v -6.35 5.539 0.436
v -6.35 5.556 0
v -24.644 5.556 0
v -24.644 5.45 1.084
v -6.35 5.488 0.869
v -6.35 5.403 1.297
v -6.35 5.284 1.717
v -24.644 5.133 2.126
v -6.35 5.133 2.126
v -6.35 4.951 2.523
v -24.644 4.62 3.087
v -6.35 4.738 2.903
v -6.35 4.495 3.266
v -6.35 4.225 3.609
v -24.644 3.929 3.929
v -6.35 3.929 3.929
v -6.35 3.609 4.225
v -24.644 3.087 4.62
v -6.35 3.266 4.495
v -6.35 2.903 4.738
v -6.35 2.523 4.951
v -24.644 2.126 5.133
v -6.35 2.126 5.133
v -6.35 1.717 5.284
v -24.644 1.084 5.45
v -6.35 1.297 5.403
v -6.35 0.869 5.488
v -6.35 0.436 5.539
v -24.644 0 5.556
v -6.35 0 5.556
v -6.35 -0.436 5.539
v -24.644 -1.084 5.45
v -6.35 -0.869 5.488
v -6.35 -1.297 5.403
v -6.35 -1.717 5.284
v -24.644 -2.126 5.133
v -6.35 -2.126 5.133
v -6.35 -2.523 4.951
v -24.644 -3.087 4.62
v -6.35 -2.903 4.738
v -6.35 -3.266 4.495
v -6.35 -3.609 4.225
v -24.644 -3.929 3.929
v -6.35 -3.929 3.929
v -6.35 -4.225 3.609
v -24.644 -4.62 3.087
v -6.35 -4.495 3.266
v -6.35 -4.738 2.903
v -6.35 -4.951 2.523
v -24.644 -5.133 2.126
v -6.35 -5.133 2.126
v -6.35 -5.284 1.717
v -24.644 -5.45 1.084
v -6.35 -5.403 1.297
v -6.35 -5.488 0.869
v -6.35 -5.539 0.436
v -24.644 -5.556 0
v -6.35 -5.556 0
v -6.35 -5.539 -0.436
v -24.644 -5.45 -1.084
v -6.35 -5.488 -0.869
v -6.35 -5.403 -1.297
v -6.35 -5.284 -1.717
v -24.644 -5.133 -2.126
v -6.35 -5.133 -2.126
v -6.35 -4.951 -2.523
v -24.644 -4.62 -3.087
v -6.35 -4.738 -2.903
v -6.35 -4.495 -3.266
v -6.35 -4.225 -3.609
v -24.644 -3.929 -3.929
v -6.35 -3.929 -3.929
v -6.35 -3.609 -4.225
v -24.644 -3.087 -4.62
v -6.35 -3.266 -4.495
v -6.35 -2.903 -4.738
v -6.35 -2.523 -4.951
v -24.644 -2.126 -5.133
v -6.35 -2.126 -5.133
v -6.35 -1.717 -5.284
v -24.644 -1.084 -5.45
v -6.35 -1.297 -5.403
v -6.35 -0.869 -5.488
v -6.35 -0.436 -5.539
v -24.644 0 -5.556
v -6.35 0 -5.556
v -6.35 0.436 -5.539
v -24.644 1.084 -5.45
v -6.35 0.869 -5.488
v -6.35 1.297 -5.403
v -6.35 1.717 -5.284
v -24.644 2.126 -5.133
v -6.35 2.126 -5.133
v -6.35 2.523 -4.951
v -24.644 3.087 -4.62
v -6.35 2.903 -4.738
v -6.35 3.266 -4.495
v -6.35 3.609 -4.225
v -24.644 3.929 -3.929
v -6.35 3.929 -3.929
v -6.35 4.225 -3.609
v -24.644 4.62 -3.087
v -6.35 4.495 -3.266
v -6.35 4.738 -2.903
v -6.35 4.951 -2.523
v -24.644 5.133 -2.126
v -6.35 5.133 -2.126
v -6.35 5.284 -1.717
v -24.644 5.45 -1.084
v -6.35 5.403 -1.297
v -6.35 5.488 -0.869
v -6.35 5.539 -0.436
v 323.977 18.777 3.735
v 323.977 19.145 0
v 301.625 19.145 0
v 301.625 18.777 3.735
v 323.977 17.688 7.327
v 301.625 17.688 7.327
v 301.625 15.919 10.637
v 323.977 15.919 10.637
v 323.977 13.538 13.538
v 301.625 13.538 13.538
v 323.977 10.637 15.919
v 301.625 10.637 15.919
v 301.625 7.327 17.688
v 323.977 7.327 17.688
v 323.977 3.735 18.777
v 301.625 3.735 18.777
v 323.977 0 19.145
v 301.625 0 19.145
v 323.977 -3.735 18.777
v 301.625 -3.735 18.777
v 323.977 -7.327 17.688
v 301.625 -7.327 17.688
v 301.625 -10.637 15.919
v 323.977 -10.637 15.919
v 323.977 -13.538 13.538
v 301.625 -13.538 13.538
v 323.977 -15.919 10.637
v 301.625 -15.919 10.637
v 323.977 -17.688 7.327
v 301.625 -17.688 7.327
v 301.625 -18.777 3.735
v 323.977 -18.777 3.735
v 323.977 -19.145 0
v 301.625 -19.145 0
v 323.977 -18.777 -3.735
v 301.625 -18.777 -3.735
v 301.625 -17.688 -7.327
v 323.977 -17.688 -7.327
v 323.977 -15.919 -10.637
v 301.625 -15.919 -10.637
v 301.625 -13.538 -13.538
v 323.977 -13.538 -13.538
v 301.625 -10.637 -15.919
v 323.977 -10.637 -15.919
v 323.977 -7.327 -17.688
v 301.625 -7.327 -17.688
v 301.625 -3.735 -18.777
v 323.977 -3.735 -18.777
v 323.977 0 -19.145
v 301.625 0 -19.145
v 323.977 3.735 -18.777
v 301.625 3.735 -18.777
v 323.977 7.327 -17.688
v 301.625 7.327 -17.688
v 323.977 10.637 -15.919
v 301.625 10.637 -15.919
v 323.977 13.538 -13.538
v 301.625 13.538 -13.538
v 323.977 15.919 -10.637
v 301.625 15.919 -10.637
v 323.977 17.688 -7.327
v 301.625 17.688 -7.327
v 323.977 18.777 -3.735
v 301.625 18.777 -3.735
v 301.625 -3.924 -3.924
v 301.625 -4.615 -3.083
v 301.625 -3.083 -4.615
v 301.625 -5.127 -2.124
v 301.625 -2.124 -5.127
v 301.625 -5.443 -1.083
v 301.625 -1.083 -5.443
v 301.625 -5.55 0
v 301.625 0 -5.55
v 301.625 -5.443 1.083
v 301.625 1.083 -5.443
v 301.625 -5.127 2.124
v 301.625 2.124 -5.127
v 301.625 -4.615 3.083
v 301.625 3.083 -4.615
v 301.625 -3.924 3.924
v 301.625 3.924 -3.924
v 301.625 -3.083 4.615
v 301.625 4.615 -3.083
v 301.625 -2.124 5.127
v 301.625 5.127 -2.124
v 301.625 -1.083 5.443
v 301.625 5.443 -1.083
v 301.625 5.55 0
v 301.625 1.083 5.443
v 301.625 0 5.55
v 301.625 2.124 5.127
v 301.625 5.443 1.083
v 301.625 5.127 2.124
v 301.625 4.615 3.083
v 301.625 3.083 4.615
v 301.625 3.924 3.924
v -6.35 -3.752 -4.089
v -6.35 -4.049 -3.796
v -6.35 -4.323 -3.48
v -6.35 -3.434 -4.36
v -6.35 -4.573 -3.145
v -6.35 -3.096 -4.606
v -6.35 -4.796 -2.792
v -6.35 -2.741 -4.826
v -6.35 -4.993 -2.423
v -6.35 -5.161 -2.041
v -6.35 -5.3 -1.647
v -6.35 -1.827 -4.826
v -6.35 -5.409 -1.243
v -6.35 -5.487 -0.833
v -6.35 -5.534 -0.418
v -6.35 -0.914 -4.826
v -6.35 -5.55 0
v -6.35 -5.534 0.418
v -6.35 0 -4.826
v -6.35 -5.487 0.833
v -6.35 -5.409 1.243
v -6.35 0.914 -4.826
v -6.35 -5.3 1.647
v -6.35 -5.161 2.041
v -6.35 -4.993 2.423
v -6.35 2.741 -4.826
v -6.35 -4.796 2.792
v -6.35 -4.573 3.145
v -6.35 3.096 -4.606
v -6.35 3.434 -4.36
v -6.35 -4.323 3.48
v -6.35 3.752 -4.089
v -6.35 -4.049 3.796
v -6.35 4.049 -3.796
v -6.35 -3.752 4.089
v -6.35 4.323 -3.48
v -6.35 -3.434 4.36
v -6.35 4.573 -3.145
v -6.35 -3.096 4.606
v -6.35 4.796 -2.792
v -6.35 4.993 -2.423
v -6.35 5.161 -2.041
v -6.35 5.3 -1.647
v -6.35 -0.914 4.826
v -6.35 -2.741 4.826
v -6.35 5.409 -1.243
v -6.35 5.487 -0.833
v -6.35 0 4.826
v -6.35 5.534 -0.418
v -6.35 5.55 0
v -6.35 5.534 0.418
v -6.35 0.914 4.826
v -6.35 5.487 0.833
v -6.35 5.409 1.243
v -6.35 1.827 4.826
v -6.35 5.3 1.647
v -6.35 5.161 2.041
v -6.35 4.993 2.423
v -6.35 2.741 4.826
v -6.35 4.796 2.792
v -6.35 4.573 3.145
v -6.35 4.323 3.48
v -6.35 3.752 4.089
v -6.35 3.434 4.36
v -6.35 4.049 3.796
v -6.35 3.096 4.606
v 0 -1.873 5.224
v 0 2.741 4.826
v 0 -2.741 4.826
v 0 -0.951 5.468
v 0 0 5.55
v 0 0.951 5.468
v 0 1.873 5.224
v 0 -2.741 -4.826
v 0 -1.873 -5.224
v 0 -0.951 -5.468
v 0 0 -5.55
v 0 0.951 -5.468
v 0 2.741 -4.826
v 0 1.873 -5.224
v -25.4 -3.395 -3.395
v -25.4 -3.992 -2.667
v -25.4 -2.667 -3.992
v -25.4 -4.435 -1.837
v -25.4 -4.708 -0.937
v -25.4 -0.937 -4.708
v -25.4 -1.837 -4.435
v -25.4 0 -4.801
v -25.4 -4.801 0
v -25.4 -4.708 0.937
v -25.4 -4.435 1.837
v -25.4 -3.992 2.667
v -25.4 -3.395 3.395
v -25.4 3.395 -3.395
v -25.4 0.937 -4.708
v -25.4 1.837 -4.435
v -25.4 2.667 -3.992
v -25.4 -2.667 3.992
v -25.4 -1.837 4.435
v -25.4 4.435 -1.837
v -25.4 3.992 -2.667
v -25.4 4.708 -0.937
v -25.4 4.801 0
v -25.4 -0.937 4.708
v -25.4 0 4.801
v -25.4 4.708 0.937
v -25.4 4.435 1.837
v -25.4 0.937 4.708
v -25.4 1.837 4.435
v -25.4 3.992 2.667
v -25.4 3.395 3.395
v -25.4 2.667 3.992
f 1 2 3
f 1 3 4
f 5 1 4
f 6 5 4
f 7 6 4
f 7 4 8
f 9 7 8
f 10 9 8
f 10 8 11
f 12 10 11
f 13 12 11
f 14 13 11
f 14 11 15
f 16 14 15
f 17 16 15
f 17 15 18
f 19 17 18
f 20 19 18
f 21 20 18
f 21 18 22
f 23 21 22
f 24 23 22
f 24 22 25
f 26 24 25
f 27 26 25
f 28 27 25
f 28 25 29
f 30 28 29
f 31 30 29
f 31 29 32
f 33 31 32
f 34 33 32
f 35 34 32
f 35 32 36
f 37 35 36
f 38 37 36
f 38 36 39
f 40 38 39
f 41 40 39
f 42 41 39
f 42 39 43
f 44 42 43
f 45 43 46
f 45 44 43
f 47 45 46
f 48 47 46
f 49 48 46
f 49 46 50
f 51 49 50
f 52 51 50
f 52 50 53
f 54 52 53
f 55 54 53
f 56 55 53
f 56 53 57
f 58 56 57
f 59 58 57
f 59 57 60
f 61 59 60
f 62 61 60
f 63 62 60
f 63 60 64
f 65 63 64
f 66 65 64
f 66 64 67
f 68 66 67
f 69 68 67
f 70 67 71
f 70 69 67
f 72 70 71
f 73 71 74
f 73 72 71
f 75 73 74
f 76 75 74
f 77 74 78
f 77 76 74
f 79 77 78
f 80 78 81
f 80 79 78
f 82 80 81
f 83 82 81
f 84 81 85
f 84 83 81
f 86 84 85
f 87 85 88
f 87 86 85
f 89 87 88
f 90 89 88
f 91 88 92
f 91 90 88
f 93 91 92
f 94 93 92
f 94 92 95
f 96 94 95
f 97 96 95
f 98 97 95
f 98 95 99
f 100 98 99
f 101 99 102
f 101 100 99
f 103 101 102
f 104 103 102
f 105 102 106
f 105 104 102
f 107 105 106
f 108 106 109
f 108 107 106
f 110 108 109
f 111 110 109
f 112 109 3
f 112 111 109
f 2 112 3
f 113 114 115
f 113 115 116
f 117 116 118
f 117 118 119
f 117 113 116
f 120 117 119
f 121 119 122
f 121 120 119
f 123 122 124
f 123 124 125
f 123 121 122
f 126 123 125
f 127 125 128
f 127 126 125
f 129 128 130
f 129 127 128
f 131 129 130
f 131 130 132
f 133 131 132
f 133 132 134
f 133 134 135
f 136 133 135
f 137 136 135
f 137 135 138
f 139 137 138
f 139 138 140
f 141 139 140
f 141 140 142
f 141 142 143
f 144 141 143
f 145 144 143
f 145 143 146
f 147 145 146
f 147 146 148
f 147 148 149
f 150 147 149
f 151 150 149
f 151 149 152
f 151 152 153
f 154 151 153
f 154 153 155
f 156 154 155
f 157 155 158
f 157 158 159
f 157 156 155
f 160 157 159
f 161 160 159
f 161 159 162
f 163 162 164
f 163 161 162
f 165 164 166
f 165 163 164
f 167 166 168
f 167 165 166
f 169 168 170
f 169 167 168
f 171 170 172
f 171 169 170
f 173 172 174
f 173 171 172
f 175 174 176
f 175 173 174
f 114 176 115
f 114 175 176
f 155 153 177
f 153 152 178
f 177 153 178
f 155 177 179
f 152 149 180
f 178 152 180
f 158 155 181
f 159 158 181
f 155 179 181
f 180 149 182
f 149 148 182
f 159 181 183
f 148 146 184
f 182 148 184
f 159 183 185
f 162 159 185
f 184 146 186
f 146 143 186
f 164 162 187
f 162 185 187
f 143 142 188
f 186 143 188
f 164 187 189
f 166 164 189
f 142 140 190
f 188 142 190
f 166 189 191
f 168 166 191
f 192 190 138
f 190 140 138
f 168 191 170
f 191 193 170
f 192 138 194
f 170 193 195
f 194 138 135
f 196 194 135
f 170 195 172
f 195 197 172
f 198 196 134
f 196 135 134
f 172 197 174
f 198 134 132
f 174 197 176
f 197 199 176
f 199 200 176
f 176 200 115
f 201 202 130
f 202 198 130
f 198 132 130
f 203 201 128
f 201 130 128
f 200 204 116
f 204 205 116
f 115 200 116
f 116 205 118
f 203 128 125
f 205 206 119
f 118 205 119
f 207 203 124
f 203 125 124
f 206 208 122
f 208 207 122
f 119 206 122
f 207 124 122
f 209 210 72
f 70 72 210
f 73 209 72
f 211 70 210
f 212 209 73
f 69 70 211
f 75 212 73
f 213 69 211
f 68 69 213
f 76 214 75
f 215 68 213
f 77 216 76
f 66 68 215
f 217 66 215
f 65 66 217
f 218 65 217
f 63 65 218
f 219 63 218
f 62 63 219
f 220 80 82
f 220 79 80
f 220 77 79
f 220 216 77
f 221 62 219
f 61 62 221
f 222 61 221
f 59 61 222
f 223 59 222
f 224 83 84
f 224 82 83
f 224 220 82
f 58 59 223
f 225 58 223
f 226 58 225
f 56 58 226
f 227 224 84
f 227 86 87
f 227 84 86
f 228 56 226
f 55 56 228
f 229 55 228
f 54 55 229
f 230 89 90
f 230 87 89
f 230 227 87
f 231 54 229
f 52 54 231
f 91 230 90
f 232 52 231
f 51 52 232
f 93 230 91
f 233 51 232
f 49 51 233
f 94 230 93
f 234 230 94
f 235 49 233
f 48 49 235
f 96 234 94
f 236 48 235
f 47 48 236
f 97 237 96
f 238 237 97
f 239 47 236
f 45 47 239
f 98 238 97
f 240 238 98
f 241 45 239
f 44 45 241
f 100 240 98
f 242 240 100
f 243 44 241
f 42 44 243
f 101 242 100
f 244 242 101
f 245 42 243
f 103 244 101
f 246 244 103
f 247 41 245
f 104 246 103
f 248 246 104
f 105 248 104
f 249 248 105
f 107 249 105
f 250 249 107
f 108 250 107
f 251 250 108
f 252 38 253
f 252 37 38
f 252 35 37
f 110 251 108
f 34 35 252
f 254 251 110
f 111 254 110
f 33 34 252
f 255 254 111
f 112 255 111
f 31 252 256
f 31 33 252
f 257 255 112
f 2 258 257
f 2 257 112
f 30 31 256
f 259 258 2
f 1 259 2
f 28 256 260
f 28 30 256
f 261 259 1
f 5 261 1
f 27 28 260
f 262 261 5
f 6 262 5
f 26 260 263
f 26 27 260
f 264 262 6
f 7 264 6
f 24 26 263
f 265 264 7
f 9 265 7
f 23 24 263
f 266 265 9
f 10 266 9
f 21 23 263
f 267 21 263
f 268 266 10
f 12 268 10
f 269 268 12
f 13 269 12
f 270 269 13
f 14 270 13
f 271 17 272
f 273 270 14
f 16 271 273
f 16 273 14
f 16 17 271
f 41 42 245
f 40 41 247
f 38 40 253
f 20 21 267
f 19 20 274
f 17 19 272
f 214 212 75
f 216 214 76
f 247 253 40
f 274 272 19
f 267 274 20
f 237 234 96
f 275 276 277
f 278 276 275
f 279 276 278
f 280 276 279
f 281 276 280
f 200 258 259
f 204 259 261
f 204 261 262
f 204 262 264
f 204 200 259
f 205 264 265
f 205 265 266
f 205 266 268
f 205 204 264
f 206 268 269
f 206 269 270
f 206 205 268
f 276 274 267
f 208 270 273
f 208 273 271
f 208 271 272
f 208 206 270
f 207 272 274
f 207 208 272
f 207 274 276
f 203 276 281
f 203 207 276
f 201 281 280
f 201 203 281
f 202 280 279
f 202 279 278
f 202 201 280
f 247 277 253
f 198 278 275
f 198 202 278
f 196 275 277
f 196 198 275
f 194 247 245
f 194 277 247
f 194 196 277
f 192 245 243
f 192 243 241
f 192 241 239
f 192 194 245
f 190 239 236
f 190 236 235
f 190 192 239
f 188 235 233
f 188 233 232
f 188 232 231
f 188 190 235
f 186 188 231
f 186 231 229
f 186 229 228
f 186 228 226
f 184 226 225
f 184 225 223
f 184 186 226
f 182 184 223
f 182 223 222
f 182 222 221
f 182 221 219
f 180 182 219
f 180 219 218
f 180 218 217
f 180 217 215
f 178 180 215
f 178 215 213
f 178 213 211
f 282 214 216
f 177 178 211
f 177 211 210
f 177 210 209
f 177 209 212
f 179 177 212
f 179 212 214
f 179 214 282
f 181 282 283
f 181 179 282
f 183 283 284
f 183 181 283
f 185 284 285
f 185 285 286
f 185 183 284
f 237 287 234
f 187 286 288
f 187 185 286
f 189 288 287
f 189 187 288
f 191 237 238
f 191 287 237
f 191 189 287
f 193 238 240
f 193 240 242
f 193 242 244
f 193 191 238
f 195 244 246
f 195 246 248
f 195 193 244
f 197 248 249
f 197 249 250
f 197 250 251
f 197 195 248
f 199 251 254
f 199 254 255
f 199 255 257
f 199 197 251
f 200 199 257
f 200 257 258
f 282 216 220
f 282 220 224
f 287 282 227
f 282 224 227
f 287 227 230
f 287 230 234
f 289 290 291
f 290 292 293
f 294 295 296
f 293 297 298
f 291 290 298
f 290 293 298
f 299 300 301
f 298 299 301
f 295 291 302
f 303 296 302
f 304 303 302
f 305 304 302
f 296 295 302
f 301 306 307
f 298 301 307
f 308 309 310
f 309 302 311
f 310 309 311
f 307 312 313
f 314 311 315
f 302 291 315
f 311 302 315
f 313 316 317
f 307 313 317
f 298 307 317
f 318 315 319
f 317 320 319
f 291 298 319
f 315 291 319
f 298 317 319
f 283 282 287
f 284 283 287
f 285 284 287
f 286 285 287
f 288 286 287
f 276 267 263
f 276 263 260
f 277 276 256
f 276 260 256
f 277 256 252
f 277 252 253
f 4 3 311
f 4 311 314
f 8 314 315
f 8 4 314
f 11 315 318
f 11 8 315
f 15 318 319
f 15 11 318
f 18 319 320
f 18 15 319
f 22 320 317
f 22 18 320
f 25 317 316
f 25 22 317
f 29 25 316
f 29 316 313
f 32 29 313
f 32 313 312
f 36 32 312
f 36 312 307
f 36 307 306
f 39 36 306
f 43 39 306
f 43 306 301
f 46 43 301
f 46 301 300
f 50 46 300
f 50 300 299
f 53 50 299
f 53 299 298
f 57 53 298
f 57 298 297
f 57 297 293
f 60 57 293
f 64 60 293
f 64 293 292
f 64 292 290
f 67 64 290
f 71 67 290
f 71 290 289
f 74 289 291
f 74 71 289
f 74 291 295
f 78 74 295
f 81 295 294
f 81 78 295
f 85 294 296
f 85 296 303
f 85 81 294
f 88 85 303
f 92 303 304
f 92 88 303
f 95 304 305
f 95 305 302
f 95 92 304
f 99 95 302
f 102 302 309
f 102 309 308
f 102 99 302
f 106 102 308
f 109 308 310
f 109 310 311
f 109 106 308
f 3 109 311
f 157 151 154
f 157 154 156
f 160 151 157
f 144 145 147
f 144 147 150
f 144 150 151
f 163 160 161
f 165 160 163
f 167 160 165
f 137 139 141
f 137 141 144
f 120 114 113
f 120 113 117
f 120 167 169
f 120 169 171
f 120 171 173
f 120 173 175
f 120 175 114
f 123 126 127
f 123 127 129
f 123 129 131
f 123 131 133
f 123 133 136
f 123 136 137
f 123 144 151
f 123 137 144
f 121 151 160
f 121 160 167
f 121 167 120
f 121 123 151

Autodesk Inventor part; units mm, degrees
sketch "Sketch_1" plane through (0, 0, 0) normal (0, 0, 1) x (1, 0, 0)
  line L0 (323.977, 0) -> (-6.35, 0)
  line L1 (-6.35, 0) -> (-6.35, 5.5499)
  line L2 (-6.35, 5.5499) -> (301.625, 5.5499)
  line L3 (301.625, 5.5499) -> (301.625, 19.1453)
  line L4 (301.625, 19.1453) -> (323.977, 19.1453)
  line L5 (323.977, 19.1453) -> (323.977, 0)
  line L6 (323.977, 0) -> (-6.35, 0)
revolve "Revolution1" add sketch "Sketch_1" angle 360 about axis through (323.977, 0, 0) along (1, 0, 0)
sketch "Sketch_3" plane through (0, 0, 0) normal (0, 0, 1) x (1, 0, 0)
  line L0 (-6.35, 0) -> (-25.4, 0)
  line L1 (-25.4, 0) -> (-25.4, 4.8006)
  line L2 (-25.4, 4.8006) -> (-24.6443, 5.5563)
  line L3 (-24.6443, 5.5563) -> (-6.35, 5.5563)
  line L4 (-6.35, 5.5563) -> (-6.35, 0)
  line L5 (-6.35, 0) -> (-25.4, 0)
revolve "Revolution2" add sketch "Sketch_3" angle 360 about axis through (-6.35, 0, 0) along (1, 0, 0)
thread "Thread1" size "7/16-20 UNF" class "2A" standard "ANSI Unified Screw Threads" full length
sketch "Sketch_10" plane through (-6.35, 0, 0) normal (1, 0, 0) x (0, 0, -1)
  line L0 (-11.0998, -11.0998) -> (11.0998, -11.0998)
  line L1 (11.0998, -11.0998) -> (11.0998, 11.0998)
  line L2 (11.0998, 11.0998) -> (-11.0998, 11.0998)
  line L3 (-11.0998, 11.0998) -> (-11.0998, -11.0998)
  line L4 (-4.826, -5.5499) -> (4.826, -5.5499)
  line L5 (4.826, -5.5499) -> (4.826, 5.5499)
  line L6 (4.826, 5.5499) -> (-4.826, 5.5499)
  line L7 (-4.826, 5.5499) -> (-4.826, -5.5499)
extrude "Extrusion1" cut sketch "Sketch_10" along normal blind 6.35
ref_plane "dia1_XY" through (-6.35, 5.5499, 0) normal (1, 0, 0) x (0, 0, -1)
ref_plane "dia1_YZ" through (-6.35, 5.5499, 0) normal (0, 0, -1) x (0, 1, 0)
ref_plane "dia1_ZX" through (-6.35, 5.5499, 0) normal (0, 1, 0) x (1, 0, 0)
ref_plane "dia12_XY" through (0, 0, 19.7675) normal (1, 0, 0) x (0, 0, -1)
ref_plane "dia12_YZ" through (0, 0, 19.7675) normal (0, 0, -1) x (0, 1, 0)
ref_plane "dia12_ZX" through (0, 0, 19.7675) normal (0, 1, 0) x (1, 0, 0)
ref_plane "dia2_XY" through (-6.35, -5.5499, 0) normal (1, 0, 0) x (0, 0, -1)
ref_plane "dia2_YZ" through (-6.35, -5.5499, 0) normal (0, 0, -1) x (0, 1, 0)
ref_plane "dia2_ZX" through (-6.35, -5.5499, 0) normal (0, 1, 0) x (1, 0, 0)
ref_plane "dia22_XY" through (0, 0, -19.7675) normal (1, 0, 0) x (0, 0, -1)
ref_plane "dia22_YZ" through (0, 0, -19.7675) normal (0, 0, -1) x (0, 1, 0)
ref_plane "dia22_ZX" through (0, 0, -19.7675) normal (0, 1, 0) x (1, 0, 0)
ref_plane "rl1_XY" through (-25.4, 0, 0) normal (1, 0, 0) x (0, 0, -1)
ref_plane "rl1_YZ" through (-25.4, 0, 0) normal (0, 0, -1) x (0, 1, 0)
ref_plane "rl1_ZX" through (-25.4, 0, 0) normal (0, 1, 0) x (1, 0, 0)
ref_plane "rl2_XY" through (-6.35, 0, 0) normal (1, 0, 0) x (0, 0, -1)
ref_plane "rl2_YZ" through (-6.35, 0, 0) normal (0, 0, -1) x (0, 1, 0)
ref_plane "rl2_ZX" through (-6.35, 0, 0) normal (0, 1, 0) x (1, 0, 0)
ref_plane "rod_cp_XY" through (0, 0, 0) normal (1, 0, 0) x (0, 0, -1)
ref_plane "rod_cp_YZ" through (0, 0, 0) normal (0, 0, -1) x (0, 1, 0)
ref_plane "rod_cp_ZX" through (0, 0, 0) normal (0, 1, 0) x (1, 0, 0)
ref_plane "thd1_XY" through (-25.4, 5.5563, 0) normal (1, 0, 0) x (0, 0, -1)
ref_plane "thd1_YZ" through (-25.4, 5.5563, 0) normal (0, 0, -1) x (0, 1, 0)
ref_plane "thd1_ZX" through (-25.4, 5.5563, 0) normal (0, 1, 0) x (1, 0, 0)
ref_plane "thd2_XY" through (-25.4, -5.5563, 0) normal (1, 0, 0) x (0, 0, -1)
ref_plane "thd2_YZ" through (-25.4, -5.5563, 0) normal (0, 0, -1) x (0, 1, 0)
ref_plane "thd2_ZX" through (-25.4, -5.5563, 0) normal (0, 1, 0) x (1, 0, 0)
ref_plane "to_rod_clevis_XY" through (-30.988, 0, 0) normal (1, 0, 0) x (0, 0, -1)
ref_plane "to_rod_clevis_YZ" through (-30.988, 0, 0) normal (0, 0, -1) x (0, 1, 0)
ref_plane "to_rod_clevis_ZX" through (-30.988, 0, 0) normal (0, 1, 0) x (1, 0, 0)
ref_plane "wf1_XY" through (-6.35, 0, 0) normal (1, 0, 0) x (0, 0, -1)
ref_plane "wf1_YZ" through (-6.35, 0, 0) normal (0, 0, -1) x (0, 1, 0)
ref_plane "wf1_ZX" through (-6.35, 0, 0) normal (0, 1, 0) x (1, 0, 0)
ref_plane "wf2_XY" through (0, 0, 0) normal (1, 0, 0) x (0, 0, -1)
ref_plane "wf2_YZ" through (0, 0, 0) normal (0, 0, -1) x (0, 1, 0)
ref_plane "wf2_ZX" through (0, 0, 0) normal (0, 1, 0) x (1, 0, 0)
ref_plane "wfw1_XY" through (-6.35, 0, -4.826) normal (0, 1, 0) x (1, 0, 0)
ref_plane "wfw1_YZ" through (-6.35, 0, -4.826) normal (1, 0, 0) x (0, 0, -1)
ref_plane "wfw1_ZX" through (-6.35, 0, -4.826) normal (0, 0, -1) x (0, 1, 0)
ref_plane "wfw2_XY" through (-6.35, 0, 4.826) normal (0, 1, 0) x (1, 0, 0)
ref_plane "wfw2_YZ" through (-6.35, 0, 4.826) normal (1, 0, 0) x (0, 0, -1)
ref_plane "wfw2_ZX" through (-6.35, 0, 4.826) normal (0, 0, -1) x (0, 1, 0)
properties part number "C-175-DPEE50_rod" material "Steel, Galvanized"
